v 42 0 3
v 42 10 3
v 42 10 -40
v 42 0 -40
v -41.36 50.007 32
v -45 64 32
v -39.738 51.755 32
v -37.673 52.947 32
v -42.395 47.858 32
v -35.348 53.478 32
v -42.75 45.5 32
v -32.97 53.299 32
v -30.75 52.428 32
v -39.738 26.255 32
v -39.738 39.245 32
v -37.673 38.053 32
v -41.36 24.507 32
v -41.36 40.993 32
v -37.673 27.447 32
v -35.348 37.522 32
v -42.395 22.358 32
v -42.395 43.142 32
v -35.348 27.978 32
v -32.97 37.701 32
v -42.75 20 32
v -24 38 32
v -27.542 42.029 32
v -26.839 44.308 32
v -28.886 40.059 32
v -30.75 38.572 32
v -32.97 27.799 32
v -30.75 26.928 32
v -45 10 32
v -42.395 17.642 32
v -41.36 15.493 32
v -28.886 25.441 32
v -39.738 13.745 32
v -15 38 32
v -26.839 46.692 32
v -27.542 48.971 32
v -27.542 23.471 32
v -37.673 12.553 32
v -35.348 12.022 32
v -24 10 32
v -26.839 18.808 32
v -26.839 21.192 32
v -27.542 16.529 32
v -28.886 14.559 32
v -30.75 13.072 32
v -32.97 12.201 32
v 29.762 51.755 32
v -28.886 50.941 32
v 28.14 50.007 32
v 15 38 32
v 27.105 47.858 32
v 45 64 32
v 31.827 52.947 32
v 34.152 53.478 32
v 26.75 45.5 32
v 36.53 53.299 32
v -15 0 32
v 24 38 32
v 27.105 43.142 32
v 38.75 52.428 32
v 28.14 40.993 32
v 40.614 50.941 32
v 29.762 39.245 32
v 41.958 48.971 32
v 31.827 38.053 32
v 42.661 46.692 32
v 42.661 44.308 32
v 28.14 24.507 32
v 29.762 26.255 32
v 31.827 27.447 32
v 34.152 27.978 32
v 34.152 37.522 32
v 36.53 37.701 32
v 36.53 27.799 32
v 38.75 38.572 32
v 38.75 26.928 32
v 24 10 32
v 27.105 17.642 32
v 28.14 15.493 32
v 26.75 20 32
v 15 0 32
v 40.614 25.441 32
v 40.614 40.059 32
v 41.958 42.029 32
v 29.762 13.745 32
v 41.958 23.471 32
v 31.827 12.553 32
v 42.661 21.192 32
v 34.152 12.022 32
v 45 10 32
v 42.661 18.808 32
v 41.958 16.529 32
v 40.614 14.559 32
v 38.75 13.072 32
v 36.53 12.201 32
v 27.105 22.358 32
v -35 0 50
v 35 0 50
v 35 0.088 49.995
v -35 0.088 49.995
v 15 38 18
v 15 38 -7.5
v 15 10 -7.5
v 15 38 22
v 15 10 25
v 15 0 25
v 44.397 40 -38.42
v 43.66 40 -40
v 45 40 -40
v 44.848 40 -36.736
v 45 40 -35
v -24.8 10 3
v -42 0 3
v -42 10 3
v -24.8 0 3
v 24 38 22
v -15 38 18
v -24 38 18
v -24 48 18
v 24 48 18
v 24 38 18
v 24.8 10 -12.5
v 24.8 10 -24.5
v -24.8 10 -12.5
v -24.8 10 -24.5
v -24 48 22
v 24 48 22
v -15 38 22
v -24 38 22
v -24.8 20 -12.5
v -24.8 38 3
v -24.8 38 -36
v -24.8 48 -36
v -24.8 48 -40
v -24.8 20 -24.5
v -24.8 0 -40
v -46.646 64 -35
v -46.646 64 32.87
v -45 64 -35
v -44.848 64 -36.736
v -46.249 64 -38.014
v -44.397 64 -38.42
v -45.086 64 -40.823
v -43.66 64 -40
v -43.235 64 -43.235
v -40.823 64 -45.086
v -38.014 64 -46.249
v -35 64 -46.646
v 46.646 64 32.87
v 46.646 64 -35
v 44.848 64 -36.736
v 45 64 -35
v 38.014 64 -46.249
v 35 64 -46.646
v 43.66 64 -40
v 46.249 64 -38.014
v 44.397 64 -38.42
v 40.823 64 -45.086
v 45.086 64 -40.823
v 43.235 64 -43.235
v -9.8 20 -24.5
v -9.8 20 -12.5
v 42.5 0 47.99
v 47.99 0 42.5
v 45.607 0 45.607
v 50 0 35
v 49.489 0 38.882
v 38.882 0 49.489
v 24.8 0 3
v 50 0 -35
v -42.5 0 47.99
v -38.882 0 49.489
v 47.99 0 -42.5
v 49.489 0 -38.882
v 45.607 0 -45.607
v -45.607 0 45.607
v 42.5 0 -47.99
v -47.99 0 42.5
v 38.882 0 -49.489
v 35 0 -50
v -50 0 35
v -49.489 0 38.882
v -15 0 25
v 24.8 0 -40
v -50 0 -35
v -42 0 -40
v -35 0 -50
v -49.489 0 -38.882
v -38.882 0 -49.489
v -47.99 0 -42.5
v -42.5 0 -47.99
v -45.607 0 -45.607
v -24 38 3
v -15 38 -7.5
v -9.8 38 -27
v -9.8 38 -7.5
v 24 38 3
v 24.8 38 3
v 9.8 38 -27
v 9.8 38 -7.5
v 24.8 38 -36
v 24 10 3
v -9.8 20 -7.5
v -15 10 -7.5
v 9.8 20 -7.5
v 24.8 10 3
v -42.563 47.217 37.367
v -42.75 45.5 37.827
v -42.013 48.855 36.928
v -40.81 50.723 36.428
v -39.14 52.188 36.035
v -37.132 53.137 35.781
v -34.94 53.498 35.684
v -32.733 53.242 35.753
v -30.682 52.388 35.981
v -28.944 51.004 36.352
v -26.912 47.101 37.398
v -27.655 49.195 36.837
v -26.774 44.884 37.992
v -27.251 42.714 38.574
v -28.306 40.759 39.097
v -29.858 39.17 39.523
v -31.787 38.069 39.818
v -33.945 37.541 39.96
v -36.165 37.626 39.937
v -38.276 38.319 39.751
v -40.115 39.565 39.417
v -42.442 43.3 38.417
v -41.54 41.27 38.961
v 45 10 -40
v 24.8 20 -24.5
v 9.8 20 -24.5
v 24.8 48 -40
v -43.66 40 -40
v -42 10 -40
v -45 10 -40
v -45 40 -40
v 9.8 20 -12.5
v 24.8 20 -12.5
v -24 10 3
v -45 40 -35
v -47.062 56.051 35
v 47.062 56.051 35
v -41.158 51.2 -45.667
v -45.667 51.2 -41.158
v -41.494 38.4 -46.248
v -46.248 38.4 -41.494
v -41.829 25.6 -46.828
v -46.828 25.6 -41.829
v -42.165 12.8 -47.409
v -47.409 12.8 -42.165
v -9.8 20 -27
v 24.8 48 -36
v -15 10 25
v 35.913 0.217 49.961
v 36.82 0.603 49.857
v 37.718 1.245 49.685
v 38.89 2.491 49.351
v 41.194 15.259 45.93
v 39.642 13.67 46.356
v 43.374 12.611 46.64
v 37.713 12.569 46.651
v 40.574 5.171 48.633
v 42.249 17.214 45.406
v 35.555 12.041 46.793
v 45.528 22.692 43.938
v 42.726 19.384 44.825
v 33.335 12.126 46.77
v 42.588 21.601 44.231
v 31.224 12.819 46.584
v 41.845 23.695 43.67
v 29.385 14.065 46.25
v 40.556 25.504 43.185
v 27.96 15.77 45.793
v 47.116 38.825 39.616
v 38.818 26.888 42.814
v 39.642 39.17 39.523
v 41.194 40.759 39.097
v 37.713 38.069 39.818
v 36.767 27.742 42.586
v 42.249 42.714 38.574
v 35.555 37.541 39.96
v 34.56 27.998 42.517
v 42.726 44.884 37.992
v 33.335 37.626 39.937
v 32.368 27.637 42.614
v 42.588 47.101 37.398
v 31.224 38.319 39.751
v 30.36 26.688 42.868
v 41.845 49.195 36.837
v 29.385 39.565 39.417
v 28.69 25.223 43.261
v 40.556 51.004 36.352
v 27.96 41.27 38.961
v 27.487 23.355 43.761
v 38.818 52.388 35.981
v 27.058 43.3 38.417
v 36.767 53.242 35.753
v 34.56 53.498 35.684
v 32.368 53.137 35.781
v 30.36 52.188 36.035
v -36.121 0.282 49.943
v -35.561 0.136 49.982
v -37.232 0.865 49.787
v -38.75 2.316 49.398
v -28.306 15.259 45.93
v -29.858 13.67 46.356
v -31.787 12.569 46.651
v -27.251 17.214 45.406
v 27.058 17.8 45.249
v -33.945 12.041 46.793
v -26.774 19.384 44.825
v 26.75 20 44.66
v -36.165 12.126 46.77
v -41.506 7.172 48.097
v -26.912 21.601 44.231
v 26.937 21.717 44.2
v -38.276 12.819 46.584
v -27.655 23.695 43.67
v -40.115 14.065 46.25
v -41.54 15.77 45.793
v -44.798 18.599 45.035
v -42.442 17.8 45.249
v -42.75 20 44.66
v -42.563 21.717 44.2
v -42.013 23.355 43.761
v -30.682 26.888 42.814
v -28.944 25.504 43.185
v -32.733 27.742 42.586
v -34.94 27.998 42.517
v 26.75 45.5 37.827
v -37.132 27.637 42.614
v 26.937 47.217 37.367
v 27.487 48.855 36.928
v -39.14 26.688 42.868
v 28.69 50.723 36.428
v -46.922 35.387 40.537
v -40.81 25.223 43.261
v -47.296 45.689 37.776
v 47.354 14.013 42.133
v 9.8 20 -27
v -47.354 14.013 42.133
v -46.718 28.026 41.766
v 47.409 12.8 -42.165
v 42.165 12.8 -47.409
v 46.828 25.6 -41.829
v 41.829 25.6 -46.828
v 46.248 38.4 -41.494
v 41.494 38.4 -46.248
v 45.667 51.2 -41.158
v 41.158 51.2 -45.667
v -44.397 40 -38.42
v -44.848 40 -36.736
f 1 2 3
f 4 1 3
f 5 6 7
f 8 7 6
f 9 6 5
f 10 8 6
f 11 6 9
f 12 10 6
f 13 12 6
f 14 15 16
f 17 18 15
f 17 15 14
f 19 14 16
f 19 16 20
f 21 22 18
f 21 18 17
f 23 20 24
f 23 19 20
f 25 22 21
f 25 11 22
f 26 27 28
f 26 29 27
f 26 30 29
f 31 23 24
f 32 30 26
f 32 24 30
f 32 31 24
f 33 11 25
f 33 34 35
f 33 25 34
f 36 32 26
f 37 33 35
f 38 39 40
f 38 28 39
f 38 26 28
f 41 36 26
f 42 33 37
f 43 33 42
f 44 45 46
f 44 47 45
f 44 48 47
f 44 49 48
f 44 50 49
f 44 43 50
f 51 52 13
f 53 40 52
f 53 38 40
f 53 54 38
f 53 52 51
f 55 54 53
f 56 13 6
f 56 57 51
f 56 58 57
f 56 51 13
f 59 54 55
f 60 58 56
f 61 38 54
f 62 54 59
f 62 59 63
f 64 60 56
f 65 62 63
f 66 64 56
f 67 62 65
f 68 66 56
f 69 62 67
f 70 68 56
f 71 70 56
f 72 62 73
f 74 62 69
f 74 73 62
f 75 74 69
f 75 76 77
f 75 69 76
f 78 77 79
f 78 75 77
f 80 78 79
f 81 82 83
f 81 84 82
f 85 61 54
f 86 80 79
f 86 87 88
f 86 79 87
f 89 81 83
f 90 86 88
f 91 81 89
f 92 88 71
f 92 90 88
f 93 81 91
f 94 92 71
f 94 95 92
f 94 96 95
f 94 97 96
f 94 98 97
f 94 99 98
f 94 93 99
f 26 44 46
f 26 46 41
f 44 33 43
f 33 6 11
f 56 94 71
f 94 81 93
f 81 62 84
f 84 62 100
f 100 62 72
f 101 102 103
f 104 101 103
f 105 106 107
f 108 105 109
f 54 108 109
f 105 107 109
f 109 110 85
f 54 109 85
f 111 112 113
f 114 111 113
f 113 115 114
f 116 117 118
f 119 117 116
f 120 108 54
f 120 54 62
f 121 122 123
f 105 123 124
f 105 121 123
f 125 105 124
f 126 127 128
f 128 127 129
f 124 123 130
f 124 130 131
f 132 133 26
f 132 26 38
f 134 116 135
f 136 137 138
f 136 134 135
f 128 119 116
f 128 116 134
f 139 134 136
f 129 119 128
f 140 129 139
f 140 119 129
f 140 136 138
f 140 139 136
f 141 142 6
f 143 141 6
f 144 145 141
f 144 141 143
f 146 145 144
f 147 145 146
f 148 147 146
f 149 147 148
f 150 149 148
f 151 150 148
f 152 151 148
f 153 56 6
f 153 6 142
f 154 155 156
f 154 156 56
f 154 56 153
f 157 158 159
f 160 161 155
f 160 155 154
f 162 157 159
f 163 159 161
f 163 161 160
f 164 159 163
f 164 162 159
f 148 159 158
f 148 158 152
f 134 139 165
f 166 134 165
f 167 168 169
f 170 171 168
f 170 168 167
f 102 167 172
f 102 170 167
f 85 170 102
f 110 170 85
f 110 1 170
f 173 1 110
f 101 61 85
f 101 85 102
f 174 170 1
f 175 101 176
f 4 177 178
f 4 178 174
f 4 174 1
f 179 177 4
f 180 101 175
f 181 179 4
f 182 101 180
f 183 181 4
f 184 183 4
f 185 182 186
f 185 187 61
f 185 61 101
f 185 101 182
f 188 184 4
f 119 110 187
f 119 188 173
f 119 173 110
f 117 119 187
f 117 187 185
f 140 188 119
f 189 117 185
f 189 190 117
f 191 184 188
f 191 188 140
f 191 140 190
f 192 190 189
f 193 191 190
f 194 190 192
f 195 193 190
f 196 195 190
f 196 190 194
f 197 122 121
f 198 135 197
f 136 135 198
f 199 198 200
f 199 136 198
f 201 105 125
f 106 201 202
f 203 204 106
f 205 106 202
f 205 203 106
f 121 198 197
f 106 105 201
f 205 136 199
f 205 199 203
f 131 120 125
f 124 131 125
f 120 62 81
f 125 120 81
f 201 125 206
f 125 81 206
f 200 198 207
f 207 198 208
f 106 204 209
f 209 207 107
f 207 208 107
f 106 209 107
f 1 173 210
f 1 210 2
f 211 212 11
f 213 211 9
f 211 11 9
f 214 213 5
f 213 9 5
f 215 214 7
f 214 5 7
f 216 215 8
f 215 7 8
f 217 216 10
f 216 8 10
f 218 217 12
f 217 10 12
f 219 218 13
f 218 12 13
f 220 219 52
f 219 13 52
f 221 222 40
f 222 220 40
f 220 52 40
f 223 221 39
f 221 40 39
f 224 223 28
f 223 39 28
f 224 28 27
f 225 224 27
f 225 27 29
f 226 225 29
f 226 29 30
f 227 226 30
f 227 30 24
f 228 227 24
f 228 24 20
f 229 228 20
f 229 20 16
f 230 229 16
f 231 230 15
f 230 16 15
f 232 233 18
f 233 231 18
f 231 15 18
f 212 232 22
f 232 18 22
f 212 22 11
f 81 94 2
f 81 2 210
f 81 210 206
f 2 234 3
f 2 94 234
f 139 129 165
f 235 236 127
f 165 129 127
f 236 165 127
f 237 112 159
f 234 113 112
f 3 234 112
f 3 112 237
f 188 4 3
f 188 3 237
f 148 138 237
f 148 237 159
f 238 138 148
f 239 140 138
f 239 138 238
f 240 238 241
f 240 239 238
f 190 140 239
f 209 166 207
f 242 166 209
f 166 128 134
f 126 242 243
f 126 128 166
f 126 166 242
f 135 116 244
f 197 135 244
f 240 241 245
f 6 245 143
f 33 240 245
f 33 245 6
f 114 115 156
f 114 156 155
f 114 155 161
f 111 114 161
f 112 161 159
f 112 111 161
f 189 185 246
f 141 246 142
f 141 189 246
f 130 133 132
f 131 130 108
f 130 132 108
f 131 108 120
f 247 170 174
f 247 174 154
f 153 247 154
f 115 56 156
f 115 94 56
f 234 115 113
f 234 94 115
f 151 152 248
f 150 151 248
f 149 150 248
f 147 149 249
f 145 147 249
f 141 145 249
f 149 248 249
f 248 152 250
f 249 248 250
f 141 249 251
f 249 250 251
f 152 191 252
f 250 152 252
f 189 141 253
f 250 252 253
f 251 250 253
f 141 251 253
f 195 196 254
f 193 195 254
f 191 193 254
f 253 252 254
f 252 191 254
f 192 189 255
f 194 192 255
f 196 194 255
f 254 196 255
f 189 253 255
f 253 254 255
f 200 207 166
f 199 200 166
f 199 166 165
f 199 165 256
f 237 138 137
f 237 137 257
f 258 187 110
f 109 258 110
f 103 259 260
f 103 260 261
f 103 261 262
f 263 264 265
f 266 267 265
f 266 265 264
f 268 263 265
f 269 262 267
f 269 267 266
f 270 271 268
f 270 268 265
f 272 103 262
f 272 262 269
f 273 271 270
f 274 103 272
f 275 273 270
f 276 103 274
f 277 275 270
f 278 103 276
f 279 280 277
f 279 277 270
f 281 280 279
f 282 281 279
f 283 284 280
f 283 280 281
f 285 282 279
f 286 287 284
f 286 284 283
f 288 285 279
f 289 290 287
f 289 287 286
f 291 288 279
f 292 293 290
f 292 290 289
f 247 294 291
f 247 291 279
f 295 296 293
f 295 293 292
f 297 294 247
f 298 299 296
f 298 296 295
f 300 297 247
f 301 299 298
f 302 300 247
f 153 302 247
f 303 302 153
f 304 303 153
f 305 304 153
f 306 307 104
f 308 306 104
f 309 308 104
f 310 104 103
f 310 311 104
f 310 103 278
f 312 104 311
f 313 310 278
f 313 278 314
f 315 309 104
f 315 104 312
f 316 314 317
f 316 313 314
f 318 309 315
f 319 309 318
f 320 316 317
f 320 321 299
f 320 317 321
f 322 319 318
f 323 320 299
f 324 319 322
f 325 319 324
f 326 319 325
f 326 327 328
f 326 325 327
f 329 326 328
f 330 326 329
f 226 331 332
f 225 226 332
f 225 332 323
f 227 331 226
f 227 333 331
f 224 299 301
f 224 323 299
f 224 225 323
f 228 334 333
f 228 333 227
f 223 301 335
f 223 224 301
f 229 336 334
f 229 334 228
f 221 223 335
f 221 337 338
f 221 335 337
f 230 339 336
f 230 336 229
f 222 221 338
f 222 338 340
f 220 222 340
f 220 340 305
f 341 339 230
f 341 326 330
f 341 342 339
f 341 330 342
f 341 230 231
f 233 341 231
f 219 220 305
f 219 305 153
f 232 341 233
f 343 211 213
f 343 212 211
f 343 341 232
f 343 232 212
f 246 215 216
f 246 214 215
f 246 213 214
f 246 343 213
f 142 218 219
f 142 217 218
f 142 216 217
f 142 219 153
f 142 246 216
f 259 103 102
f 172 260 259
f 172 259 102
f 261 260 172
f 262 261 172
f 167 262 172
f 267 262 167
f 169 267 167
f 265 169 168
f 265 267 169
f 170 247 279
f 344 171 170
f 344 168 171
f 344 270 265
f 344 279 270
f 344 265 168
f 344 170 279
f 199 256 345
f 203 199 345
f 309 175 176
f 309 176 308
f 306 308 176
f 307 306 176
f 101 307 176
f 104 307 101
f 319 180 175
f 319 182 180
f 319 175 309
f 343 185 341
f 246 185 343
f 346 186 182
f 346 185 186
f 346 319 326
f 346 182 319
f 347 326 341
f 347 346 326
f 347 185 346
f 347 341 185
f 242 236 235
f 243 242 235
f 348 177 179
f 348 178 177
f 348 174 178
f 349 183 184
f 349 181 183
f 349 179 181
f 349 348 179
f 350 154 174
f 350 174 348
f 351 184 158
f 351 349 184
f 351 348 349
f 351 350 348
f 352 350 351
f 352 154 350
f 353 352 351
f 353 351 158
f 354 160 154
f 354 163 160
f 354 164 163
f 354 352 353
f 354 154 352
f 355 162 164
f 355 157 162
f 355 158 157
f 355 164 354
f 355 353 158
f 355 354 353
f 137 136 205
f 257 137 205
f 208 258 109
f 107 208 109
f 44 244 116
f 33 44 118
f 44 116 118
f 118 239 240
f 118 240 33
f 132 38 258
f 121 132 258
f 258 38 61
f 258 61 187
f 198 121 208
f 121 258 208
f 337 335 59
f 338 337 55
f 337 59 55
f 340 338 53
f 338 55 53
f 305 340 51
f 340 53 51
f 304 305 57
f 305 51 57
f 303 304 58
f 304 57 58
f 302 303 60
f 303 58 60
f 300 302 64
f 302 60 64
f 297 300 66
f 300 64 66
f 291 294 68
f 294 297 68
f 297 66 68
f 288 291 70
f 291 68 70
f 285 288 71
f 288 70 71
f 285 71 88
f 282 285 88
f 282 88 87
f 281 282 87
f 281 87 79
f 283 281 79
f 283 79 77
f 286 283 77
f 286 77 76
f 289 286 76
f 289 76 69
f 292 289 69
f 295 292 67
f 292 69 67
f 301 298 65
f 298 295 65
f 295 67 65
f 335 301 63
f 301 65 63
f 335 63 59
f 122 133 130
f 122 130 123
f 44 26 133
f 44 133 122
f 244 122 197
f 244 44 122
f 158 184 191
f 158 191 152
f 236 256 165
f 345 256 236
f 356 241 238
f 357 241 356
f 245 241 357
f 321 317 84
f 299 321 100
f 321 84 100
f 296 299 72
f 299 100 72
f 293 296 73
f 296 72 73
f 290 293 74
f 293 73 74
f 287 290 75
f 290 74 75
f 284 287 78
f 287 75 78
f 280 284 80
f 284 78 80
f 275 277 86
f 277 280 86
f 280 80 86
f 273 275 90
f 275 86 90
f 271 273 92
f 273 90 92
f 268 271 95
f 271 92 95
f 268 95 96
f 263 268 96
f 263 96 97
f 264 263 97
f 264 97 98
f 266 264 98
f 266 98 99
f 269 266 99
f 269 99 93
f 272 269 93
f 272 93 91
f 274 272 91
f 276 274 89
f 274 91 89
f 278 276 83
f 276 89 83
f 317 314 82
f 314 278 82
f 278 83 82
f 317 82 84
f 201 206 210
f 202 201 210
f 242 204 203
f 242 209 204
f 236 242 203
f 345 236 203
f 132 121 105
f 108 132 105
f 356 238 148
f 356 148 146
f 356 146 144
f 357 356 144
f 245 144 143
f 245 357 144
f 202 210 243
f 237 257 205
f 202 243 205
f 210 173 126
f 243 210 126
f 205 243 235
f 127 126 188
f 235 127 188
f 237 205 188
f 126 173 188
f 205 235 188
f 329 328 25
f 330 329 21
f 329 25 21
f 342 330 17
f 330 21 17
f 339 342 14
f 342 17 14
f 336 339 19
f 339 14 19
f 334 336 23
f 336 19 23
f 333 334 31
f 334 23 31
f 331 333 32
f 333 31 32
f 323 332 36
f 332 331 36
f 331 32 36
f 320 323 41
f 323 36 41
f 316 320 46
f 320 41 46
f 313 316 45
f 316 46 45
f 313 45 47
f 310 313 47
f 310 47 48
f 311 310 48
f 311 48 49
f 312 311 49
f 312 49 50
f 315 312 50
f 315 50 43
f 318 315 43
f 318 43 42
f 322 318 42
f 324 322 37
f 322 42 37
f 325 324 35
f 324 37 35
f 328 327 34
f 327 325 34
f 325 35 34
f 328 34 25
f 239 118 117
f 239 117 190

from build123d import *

# Parameters (mm, degrees)
BOSS_EXTRUDE1_DEPTH  = 10
SKETCH2_W            = 17.2
SKETCH2_H            = 43
CUT_EXTRUDE1_DEPTH   = 72.414284285
SKETCH3_W            = 90
SKETCH3_H            = 34
SKETCH3_W_2          = 80
SKETCH3_H_2          = 24
BOSS_EXTRUDE3_DEPTH  = 15
SKETCH4_W            = 49.6
SKETCH4_H            = 5
BOSS_EXTRUDE4_DEPTH  = 10
SKETCH5_W            = 15
SKETCH5_H            = 22
BOSS_EXTRUDE5_DEPTH  = 5
SKETCH6_W            = 90
SKETCH6_H            = 77
BOSS_EXTRUDE6_DEPTH  = 15
BOSS_EXTRUDE8_DEPTH  = 39
CHAMFER1_SIZE        = 64
CHAMFER1_SIZE_2      = 3.354097874
CHAMFER3_SIZE        = 64
CHAMFER3_SIZE_2      = 13.775745352
CUT_EXTRUDE6_DEPTH   = 2.5
CUT_EXTRUDE8_DEPTH   = 15
CUT_EXTRUDE9_DEPTH   = 15
SKETCH22_W           = 30
SKETCH22_H           = 7
CUT_EXTRUDE10_DEPTH  = 10
SKETCH25_R           = 8
CUT_EXTRUDE19_DEPTH  = 116.41230437
SKETCH29_W           = 9
SKETCH29_H           = 29
BOSS_EXTRUDE10_DEPTH = 28
SKETCH31_W           = 49.6
SKETCH31_H           = 13
BOSS_EXTRUDE12_DEPTH = 28
SKETCH30_W           = 49.6
SKETCH30_H           = 4
SKETCH30_W_2         = 48
BOSS_EXTRUDE11_DEPTH = 10
SKETCH33_W           = 15
SKETCH33_H           = 19.5
BOSS_EXTRUDE13_DEPTH = 13
SKETCH23_W           = 30
SKETCH23_H           = 28.995403325
CUT_EXTRUDE17_DEPTH  = 5
SKETCH34_W           = 9.8
SKETCH34_H           = 10.5
BOSS_EXTRUDE14_DEPTH = 28
SKETCH35_W           = 30
SKETCH35_H           = 10.5
CUT_EXTRUDE22_DEPTH  = 5
SKETCH37_W           = 30
SKETCH37_H           = 32.5
BOSS_EXTRUDE15_DEPTH = 5


with BuildPart() as part:
    # Sketch1 → Boss-Extrude1 (new body)
    with BuildSketch(Plane(origin=(0, 0, 0), x_dir=(1, 0, 0), z_dir=(0, 1, 0))):
        with BuildLine():
            Line((-35, 50), (35, 50))
            ThreePointArc((35, 50), (45.606601718, 45.606601718), (50, 35))
            Line((50, 35), (50, -35))
            ThreePointArc((50, -35), (45.606601718, -45.606601718), (35, -50))
            Line((35, -50), (-35, -50))
            ThreePointArc((-35, -50), (-45.606601718, -45.606601718), (-50, -35))
            Line((-50, -35), (-50, 35))
            ThreePointArc((-50, 35), (-45.606601718, 45.606601718), (-35, 50))
        make_face()
    extrude(amount=BOSS_EXTRUDE1_DEPTH)

    # Sketch2 → Cut-Extrude1 (cut, through all)
    with BuildSketch(Plane(origin=(0, 10, 0), x_dir=(1, 0, 0), z_dir=(0, 1, 0))):
        with Locations((-33.4, 18.5)):
            Rectangle(SKETCH2_W, SKETCH2_H)
        with Locations((33.4, 18.5)):
            Rectangle(SKETCH2_W, SKETCH2_H)
    extrude(amount=-CUT_EXTRUDE1_DEPTH, mode=Mode.SUBTRACT)

    # Sketch3 → Boss-Extrude3 (add)
    with BuildSketch(Plane(origin=(0, 10, 0), x_dir=(1, 0, 0), z_dir=(0, 1, 0))):
        with Locations((0, -20)):
            Rectangle(SKETCH3_W, SKETCH3_H)
        with Locations((0, -20)):
            Rectangle(SKETCH3_W_2, SKETCH3_H_2, mode=Mode.SUBTRACT)
    extrude(amount=BOSS_EXTRUDE3_DEPTH)

    # Sketch4 → Boss-Extrude4 (add)
    with BuildSketch(Plane(origin=(0, 10, 0), x_dir=(1, 0, 0), z_dir=(0, 1, 0))):
        with Locations((0, 10)):
            Rectangle(SKETCH4_W, SKETCH4_H)
        with Locations((0, 27)):
            Rectangle(SKETCH4_W, SKETCH4_H)
    extrude(amount=BOSS_EXTRUDE4_DEPTH)

    # Sketch5 → Boss-Extrude5 (add)
    with BuildSketch(Plane(origin=(0, 20, 0), x_dir=(1, 0, 0), z_dir=(0, 1, 0))):
        with Locations((-17.3, 18.5)):
            Rectangle(SKETCH5_W, SKETCH5_H)
        with Locations((17.3, 18.5)):
            Rectangle(SKETCH5_W, SKETCH5_H)
    extrude(amount=BOSS_EXTRUDE5_DEPTH)

    # Sketch6 → Boss-Extrude6 (add)
    with BuildSketch(Plane(origin=(0, 10, 0), x_dir=(1, 0, 0), z_dir=(0, 1, 0))):
        with BuildLine():
            Line((-50, 35), (-50, -35))
            ThreePointArc((-50, -35), (-45.606601718, -45.606601718), (-35, -50))
            Line((-35, -50), (35, -50))
            ThreePointArc((35, -50), (45.606601718, -45.606601718), (50, -35))
            Line((50, -35), (50, 35))
            ThreePointArc((50, 35), (45.606601718, 45.606601718), (35, 50))
            Line((35, 50), (-35, 50))
            ThreePointArc((-35, 50), (-45.606601718, 45.606601718), (-50, 35))
        make_face()
        with Locations((0, 1.5)):
            Rectangle(SKETCH6_W, SKETCH6_H, mode=Mode.SUBTRACT)
    extrude(amount=BOSS_EXTRUDE6_DEPTH)

    # Sketch9 → Boss-Extrude8 (add)
    with BuildSketch(Plane(origin=(0, 25, 0), x_dir=(1, 0, 0), z_dir=(0, 1, 0))):
        with BuildLine():
            Line((-50, 35), (-50, -35))
            ThreePointArc((-50, -35), (-45.606601718, -45.606601718), (-35, -50))
            Line((-35, -50), (35, -50))
            ThreePointArc((35, -50), (45.606601718, -45.606601718), (50, -35))
            Line((50, -35), (50, 35))
            ThreePointArc((50, 35), (45.606601718, 45.606601718), (35, 50))
            Line((35, 50), (-35, 50))
            ThreePointArc((-35, 50), (-45.606601718, 45.606601718), (-50, 35))
        make_face()
        with BuildLine():
            Line((-45, 35), (-45, -32))
            Line((-45, -32), (45, -32))
            Line((45, -32), (45, 35))
            ThreePointArc((45, 35), (44.659258263, 37.588190451), (43.660254038, 40))
            Line((43.660254038, 40), (-43.660254038, 40))
            ThreePointArc((-43.660254038, 40), (-44.659258263, 37.588190451), (-45, 35))
        make_face(mode=Mode.SUBTRACT)
    extrude(amount=BOSS_EXTRUDE8_DEPTH)

    # Chamfer1
    # the kernel refuses this chamfer: 64, 3.354097874 mm, written as the material it takes off along each edge
    with BuildSketch(Plane(origin=(-35, 64, 50), x_dir=(0, -0.9999979738662979, 0.002013023422382214), z_dir=(1, 0, 0)), Plane(origin=(50, 64, 35), x_dir=(0.002013023422382214, -0.9999979738662979, 0), z_dir=(0, 0, -1)), Plane(origin=(-50, 64, -35), x_dir=(-0.002013023422382214, -0.9999979738662979, 0), z_dir=(0, 0, 1)), Plane(origin=(35, 64, -50), x_dir=(0, -0.9999979738662979, -0.002013023422382214), z_dir=(-1, 0, 0))) as chamfer1_piece_1:
        Polygon((CHAMFER1_SIZE * 0.999997973866, CHAMFER1_SIZE * 0.00201302342238), (-CHAMFER1_SIZE_2 * 0.00201302342245, CHAMFER1_SIZE_2 * 0.9999979739), (0, 0), align=None)
    extrude(amount=70, mode=Mode.SUBTRACT)
    with BuildSketch(Plane(origin=(35, 64, 35), x_dir=(0, 0, 1), z_dir=(-1, 0, 0))) as chamfer1_piece_2:
        Polygon((15, -CHAMFER1_SIZE), (15 - CHAMFER1_SIZE_2, 0), (15, 0), align=None)
    revolve(axis=Axis((35, 64, 35), (0, 1, 0)), revolution_arc=90, mode=Mode.SUBTRACT)
    with BuildSketch(Plane(origin=(-35, 64, 35), x_dir=(-1, 0, 0), z_dir=(0, 0, -1))) as chamfer1_piece_3:
        Polygon((15, -CHAMFER1_SIZE), (15 - CHAMFER1_SIZE_2, 0), (15, 0), align=None)
    revolve(axis=Axis((-35, 64, 35), (0, 1, 0)), revolution_arc=90, mode=Mode.SUBTRACT)
    with BuildSketch(Plane(origin=(35, 64, -35), x_dir=(1, 0, 0), z_dir=(0, 0, 1))) as chamfer1_piece_4:
        Polygon((15, -CHAMFER1_SIZE), (15 - CHAMFER1_SIZE_2, 0), (15, 0), align=None)
    revolve(axis=Axis((35, 64, -35), (0, 1, 0)), revolution_arc=90, mode=Mode.SUBTRACT)
    with BuildSketch(Plane(origin=(-35, 64, -35), x_dir=(0, 0, -1), z_dir=(1, 0, 0))) as chamfer1_piece_5:
        Polygon((15 - CHAMFER1_SIZE_2, 0), (15, -CHAMFER1_SIZE), (15, 0), align=None)
    revolve(axis=Axis((-35, 64, -35), (0, 1, 0)), revolution_arc=90, mode=Mode.SUBTRACT)

    # Chamfer3
    # the kernel refuses this chamfer: 64, 13.775745352 mm, written as the material it takes off along each edge
    with BuildSketch(Plane(origin=(-201.265469314, 64, 46.645902126), x_dir=(0, -0.9981787050157903, 0.06032638604292662), z_dir=(1, 0, 0))) as chamfer3_piece_1:
        Polygon((CHAMFER3_SIZE * 0.999967974892, CHAMFER3_SIZE * 0.00800307379952), (-CHAMFER3_SIZE_2 * 0.060326386045, CHAMFER3_SIZE_2 * 0.99817870505), (0, 0), align=None)
    extrude(amount=402.530938629, mode=Mode.SUBTRACT)

    # Sketch17 → Cut-Extrude6 (cut)
    with BuildSketch(Plane(origin=(0, 0, -29.5), x_dir=(-1, 0, 0), z_dir=(0, 0, -1))):
        Polygon((-24.8, 10), (24.8, 10), (24.8, 25), (9.8, 25), (9.8, 20), (-9.8, 20), (-9.8, 25), (-24.8, 25), align=None)
    extrude(amount=-CUT_EXTRUDE6_DEPTH, mode=Mode.SUBTRACT)

    # Sketch20 → Cut-Extrude8 (cut)
    with BuildSketch(Plane.XZ.offset(-25)):
        with BuildLine():
            Line((-45, -35), (-45, -40))
            Line((-45, -40), (-43.660254038, -40))
            ThreePointArc((-43.660254038, -40), (-44.659258263, -37.588190451), (-45, -35))
        make_face()
        with BuildLine():
            Line((45, -40), (45, -35))
            ThreePointArc((45, -35), (44.659258263, -37.588190451), (43.660254038, -40))
            Line((43.660254038, -40), (45, -40))
        make_face()
    extrude(amount=-CUT_EXTRUDE8_DEPTH, mode=Mode.SUBTRACT)

    # Sketch21 → Cut-Extrude9 (cut)
    with BuildSketch(Plane(origin=(0, 25, 0), x_dir=(1, 0, 0), z_dir=(0, 1, 0))):
        Polygon((40, -8), (40, -32), (45, -32), (45, -3), (-45, -3), (-45, -32), (-40, -32), (-40, -8), align=None)
    extrude(amount=-CUT_EXTRUDE9_DEPTH, mode=Mode.SUBTRACT)

    # Sketch22 → Cut-Extrude10 (cut)
    with BuildSketch(Plane.XZ):
        with Locations((0, 28.5)):
            Rectangle(SKETCH22_W, SKETCH22_H)
    extrude(amount=-CUT_EXTRUDE10_DEPTH, mode=Mode.SUBTRACT)

    # Sketch25 → Cut-Extrude19 (cut, through all)
    with BuildSketch(Plane(origin=(0, 0, 32), x_dir=(-1, 0, 0), z_dir=(0, 0, -1))):
        with Locations((-34.75, 45.5)):
            Circle(SKETCH25_R)
        with Locations((34.75, 45.5)):
            Circle(SKETCH25_R)
        with Locations((-34.75, 20)):
            Circle(SKETCH25_R)
        with Locations((34.75, 20)):
            Circle(SKETCH25_R)
    extrude(amount=-CUT_EXTRUDE19_DEPTH, mode=Mode.SUBTRACT)

    # Sketch29 → Boss-Extrude10 (add)
    with BuildSketch(Plane(origin=(0, 10, 0), x_dir=(1, 0, 0), z_dir=(0, 1, 0))):
        with Locations((-19.5, -17.5)):
            Rectangle(SKETCH29_W, SKETCH29_H)
        with Locations((19.5, -17.5)):
            Rectangle(SKETCH29_W, SKETCH29_H)
    extrude(amount=BOSS_EXTRUDE10_DEPTH)

    # Sketch31 → Boss-Extrude12 (add)
    with BuildSketch(Plane(origin=(0, 10, 0), x_dir=(1, 0, 0), z_dir=(0, 1, 0))):
        with Locations((0, 33.5)):
            Rectangle(SKETCH31_W, SKETCH31_H)
    extrude(amount=BOSS_EXTRUDE12_DEPTH)

    # Sketch30 → Boss-Extrude11 (add)
    with BuildSketch(Plane(origin=(0, 38, 0), x_dir=(1, 0, 0), z_dir=(0, 1, 0))):
        with Locations((0, 38)):
            Rectangle(SKETCH30_W, SKETCH30_H)
        with Locations((0, -20)):
            Rectangle(SKETCH30_W_2, SKETCH30_H)
    extrude(amount=BOSS_EXTRUDE11_DEPTH)

    # Sketch33 → Boss-Extrude13 (add)
    with BuildSketch(Plane(origin=(0, 25, 0), x_dir=(1, 0, 0), z_dir=(0, 1, 0))):
        with Locations((17.3, 17.25)):
            Rectangle(SKETCH33_W, SKETCH33_H)
        with Locations((-17.3, 17.25)):
            Rectangle(SKETCH33_W, SKETCH33_H)
    extrude(amount=BOSS_EXTRUDE13_DEPTH)

    # Sketch23 → Cut-Extrude17 (cut)
    with BuildSketch(Plane(origin=(0, 10, 0), x_dir=(1, 0, 0), z_dir=(0, 1, 0))):
        with Locations((0, -17.497701662)):
            Rectangle(SKETCH23_W, SKETCH23_H)
    extrude(amount=-CUT_EXTRUDE17_DEPTH, mode=Mode.SUBTRACT)

    # Sketch34 → Boss-Extrude14 (add)
    with BuildSketch(Plane(origin=(0, 10, 0), x_dir=(1, 0, 0), z_dir=(0, 1, 0))):
        with Locations((-19.9, 2.25)):
            Rectangle(SKETCH34_W, SKETCH34_H)
        with Locations((19.9, 2.25)):
            Rectangle(SKETCH34_W, SKETCH34_H)
    extrude(amount=BOSS_EXTRUDE14_DEPTH)

    # Sketch35 → Cut-Extrude22 (cut)
    with BuildSketch(Plane(origin=(0, 10, 0), x_dir=(1, 0, 0), z_dir=(0, 1, 0))):
        with Locations((0, 2.25)):
            Rectangle(SKETCH35_W, SKETCH35_H)
    extrude(amount=-CUT_EXTRUDE22_DEPTH, mode=Mode.SUBTRACT)

    # Sketch37 → Boss-Extrude15 (add)
    with BuildSketch(Plane(origin=(0, 5, 0), x_dir=(1, 0, 0), z_dir=(0, 1, 0))):
        with Locations((0, -8.75)):
            Rectangle(SKETCH37_W, SKETCH37_H)
    extrude(amount=BOSS_EXTRUDE15_DEPTH)


solid = part.part
